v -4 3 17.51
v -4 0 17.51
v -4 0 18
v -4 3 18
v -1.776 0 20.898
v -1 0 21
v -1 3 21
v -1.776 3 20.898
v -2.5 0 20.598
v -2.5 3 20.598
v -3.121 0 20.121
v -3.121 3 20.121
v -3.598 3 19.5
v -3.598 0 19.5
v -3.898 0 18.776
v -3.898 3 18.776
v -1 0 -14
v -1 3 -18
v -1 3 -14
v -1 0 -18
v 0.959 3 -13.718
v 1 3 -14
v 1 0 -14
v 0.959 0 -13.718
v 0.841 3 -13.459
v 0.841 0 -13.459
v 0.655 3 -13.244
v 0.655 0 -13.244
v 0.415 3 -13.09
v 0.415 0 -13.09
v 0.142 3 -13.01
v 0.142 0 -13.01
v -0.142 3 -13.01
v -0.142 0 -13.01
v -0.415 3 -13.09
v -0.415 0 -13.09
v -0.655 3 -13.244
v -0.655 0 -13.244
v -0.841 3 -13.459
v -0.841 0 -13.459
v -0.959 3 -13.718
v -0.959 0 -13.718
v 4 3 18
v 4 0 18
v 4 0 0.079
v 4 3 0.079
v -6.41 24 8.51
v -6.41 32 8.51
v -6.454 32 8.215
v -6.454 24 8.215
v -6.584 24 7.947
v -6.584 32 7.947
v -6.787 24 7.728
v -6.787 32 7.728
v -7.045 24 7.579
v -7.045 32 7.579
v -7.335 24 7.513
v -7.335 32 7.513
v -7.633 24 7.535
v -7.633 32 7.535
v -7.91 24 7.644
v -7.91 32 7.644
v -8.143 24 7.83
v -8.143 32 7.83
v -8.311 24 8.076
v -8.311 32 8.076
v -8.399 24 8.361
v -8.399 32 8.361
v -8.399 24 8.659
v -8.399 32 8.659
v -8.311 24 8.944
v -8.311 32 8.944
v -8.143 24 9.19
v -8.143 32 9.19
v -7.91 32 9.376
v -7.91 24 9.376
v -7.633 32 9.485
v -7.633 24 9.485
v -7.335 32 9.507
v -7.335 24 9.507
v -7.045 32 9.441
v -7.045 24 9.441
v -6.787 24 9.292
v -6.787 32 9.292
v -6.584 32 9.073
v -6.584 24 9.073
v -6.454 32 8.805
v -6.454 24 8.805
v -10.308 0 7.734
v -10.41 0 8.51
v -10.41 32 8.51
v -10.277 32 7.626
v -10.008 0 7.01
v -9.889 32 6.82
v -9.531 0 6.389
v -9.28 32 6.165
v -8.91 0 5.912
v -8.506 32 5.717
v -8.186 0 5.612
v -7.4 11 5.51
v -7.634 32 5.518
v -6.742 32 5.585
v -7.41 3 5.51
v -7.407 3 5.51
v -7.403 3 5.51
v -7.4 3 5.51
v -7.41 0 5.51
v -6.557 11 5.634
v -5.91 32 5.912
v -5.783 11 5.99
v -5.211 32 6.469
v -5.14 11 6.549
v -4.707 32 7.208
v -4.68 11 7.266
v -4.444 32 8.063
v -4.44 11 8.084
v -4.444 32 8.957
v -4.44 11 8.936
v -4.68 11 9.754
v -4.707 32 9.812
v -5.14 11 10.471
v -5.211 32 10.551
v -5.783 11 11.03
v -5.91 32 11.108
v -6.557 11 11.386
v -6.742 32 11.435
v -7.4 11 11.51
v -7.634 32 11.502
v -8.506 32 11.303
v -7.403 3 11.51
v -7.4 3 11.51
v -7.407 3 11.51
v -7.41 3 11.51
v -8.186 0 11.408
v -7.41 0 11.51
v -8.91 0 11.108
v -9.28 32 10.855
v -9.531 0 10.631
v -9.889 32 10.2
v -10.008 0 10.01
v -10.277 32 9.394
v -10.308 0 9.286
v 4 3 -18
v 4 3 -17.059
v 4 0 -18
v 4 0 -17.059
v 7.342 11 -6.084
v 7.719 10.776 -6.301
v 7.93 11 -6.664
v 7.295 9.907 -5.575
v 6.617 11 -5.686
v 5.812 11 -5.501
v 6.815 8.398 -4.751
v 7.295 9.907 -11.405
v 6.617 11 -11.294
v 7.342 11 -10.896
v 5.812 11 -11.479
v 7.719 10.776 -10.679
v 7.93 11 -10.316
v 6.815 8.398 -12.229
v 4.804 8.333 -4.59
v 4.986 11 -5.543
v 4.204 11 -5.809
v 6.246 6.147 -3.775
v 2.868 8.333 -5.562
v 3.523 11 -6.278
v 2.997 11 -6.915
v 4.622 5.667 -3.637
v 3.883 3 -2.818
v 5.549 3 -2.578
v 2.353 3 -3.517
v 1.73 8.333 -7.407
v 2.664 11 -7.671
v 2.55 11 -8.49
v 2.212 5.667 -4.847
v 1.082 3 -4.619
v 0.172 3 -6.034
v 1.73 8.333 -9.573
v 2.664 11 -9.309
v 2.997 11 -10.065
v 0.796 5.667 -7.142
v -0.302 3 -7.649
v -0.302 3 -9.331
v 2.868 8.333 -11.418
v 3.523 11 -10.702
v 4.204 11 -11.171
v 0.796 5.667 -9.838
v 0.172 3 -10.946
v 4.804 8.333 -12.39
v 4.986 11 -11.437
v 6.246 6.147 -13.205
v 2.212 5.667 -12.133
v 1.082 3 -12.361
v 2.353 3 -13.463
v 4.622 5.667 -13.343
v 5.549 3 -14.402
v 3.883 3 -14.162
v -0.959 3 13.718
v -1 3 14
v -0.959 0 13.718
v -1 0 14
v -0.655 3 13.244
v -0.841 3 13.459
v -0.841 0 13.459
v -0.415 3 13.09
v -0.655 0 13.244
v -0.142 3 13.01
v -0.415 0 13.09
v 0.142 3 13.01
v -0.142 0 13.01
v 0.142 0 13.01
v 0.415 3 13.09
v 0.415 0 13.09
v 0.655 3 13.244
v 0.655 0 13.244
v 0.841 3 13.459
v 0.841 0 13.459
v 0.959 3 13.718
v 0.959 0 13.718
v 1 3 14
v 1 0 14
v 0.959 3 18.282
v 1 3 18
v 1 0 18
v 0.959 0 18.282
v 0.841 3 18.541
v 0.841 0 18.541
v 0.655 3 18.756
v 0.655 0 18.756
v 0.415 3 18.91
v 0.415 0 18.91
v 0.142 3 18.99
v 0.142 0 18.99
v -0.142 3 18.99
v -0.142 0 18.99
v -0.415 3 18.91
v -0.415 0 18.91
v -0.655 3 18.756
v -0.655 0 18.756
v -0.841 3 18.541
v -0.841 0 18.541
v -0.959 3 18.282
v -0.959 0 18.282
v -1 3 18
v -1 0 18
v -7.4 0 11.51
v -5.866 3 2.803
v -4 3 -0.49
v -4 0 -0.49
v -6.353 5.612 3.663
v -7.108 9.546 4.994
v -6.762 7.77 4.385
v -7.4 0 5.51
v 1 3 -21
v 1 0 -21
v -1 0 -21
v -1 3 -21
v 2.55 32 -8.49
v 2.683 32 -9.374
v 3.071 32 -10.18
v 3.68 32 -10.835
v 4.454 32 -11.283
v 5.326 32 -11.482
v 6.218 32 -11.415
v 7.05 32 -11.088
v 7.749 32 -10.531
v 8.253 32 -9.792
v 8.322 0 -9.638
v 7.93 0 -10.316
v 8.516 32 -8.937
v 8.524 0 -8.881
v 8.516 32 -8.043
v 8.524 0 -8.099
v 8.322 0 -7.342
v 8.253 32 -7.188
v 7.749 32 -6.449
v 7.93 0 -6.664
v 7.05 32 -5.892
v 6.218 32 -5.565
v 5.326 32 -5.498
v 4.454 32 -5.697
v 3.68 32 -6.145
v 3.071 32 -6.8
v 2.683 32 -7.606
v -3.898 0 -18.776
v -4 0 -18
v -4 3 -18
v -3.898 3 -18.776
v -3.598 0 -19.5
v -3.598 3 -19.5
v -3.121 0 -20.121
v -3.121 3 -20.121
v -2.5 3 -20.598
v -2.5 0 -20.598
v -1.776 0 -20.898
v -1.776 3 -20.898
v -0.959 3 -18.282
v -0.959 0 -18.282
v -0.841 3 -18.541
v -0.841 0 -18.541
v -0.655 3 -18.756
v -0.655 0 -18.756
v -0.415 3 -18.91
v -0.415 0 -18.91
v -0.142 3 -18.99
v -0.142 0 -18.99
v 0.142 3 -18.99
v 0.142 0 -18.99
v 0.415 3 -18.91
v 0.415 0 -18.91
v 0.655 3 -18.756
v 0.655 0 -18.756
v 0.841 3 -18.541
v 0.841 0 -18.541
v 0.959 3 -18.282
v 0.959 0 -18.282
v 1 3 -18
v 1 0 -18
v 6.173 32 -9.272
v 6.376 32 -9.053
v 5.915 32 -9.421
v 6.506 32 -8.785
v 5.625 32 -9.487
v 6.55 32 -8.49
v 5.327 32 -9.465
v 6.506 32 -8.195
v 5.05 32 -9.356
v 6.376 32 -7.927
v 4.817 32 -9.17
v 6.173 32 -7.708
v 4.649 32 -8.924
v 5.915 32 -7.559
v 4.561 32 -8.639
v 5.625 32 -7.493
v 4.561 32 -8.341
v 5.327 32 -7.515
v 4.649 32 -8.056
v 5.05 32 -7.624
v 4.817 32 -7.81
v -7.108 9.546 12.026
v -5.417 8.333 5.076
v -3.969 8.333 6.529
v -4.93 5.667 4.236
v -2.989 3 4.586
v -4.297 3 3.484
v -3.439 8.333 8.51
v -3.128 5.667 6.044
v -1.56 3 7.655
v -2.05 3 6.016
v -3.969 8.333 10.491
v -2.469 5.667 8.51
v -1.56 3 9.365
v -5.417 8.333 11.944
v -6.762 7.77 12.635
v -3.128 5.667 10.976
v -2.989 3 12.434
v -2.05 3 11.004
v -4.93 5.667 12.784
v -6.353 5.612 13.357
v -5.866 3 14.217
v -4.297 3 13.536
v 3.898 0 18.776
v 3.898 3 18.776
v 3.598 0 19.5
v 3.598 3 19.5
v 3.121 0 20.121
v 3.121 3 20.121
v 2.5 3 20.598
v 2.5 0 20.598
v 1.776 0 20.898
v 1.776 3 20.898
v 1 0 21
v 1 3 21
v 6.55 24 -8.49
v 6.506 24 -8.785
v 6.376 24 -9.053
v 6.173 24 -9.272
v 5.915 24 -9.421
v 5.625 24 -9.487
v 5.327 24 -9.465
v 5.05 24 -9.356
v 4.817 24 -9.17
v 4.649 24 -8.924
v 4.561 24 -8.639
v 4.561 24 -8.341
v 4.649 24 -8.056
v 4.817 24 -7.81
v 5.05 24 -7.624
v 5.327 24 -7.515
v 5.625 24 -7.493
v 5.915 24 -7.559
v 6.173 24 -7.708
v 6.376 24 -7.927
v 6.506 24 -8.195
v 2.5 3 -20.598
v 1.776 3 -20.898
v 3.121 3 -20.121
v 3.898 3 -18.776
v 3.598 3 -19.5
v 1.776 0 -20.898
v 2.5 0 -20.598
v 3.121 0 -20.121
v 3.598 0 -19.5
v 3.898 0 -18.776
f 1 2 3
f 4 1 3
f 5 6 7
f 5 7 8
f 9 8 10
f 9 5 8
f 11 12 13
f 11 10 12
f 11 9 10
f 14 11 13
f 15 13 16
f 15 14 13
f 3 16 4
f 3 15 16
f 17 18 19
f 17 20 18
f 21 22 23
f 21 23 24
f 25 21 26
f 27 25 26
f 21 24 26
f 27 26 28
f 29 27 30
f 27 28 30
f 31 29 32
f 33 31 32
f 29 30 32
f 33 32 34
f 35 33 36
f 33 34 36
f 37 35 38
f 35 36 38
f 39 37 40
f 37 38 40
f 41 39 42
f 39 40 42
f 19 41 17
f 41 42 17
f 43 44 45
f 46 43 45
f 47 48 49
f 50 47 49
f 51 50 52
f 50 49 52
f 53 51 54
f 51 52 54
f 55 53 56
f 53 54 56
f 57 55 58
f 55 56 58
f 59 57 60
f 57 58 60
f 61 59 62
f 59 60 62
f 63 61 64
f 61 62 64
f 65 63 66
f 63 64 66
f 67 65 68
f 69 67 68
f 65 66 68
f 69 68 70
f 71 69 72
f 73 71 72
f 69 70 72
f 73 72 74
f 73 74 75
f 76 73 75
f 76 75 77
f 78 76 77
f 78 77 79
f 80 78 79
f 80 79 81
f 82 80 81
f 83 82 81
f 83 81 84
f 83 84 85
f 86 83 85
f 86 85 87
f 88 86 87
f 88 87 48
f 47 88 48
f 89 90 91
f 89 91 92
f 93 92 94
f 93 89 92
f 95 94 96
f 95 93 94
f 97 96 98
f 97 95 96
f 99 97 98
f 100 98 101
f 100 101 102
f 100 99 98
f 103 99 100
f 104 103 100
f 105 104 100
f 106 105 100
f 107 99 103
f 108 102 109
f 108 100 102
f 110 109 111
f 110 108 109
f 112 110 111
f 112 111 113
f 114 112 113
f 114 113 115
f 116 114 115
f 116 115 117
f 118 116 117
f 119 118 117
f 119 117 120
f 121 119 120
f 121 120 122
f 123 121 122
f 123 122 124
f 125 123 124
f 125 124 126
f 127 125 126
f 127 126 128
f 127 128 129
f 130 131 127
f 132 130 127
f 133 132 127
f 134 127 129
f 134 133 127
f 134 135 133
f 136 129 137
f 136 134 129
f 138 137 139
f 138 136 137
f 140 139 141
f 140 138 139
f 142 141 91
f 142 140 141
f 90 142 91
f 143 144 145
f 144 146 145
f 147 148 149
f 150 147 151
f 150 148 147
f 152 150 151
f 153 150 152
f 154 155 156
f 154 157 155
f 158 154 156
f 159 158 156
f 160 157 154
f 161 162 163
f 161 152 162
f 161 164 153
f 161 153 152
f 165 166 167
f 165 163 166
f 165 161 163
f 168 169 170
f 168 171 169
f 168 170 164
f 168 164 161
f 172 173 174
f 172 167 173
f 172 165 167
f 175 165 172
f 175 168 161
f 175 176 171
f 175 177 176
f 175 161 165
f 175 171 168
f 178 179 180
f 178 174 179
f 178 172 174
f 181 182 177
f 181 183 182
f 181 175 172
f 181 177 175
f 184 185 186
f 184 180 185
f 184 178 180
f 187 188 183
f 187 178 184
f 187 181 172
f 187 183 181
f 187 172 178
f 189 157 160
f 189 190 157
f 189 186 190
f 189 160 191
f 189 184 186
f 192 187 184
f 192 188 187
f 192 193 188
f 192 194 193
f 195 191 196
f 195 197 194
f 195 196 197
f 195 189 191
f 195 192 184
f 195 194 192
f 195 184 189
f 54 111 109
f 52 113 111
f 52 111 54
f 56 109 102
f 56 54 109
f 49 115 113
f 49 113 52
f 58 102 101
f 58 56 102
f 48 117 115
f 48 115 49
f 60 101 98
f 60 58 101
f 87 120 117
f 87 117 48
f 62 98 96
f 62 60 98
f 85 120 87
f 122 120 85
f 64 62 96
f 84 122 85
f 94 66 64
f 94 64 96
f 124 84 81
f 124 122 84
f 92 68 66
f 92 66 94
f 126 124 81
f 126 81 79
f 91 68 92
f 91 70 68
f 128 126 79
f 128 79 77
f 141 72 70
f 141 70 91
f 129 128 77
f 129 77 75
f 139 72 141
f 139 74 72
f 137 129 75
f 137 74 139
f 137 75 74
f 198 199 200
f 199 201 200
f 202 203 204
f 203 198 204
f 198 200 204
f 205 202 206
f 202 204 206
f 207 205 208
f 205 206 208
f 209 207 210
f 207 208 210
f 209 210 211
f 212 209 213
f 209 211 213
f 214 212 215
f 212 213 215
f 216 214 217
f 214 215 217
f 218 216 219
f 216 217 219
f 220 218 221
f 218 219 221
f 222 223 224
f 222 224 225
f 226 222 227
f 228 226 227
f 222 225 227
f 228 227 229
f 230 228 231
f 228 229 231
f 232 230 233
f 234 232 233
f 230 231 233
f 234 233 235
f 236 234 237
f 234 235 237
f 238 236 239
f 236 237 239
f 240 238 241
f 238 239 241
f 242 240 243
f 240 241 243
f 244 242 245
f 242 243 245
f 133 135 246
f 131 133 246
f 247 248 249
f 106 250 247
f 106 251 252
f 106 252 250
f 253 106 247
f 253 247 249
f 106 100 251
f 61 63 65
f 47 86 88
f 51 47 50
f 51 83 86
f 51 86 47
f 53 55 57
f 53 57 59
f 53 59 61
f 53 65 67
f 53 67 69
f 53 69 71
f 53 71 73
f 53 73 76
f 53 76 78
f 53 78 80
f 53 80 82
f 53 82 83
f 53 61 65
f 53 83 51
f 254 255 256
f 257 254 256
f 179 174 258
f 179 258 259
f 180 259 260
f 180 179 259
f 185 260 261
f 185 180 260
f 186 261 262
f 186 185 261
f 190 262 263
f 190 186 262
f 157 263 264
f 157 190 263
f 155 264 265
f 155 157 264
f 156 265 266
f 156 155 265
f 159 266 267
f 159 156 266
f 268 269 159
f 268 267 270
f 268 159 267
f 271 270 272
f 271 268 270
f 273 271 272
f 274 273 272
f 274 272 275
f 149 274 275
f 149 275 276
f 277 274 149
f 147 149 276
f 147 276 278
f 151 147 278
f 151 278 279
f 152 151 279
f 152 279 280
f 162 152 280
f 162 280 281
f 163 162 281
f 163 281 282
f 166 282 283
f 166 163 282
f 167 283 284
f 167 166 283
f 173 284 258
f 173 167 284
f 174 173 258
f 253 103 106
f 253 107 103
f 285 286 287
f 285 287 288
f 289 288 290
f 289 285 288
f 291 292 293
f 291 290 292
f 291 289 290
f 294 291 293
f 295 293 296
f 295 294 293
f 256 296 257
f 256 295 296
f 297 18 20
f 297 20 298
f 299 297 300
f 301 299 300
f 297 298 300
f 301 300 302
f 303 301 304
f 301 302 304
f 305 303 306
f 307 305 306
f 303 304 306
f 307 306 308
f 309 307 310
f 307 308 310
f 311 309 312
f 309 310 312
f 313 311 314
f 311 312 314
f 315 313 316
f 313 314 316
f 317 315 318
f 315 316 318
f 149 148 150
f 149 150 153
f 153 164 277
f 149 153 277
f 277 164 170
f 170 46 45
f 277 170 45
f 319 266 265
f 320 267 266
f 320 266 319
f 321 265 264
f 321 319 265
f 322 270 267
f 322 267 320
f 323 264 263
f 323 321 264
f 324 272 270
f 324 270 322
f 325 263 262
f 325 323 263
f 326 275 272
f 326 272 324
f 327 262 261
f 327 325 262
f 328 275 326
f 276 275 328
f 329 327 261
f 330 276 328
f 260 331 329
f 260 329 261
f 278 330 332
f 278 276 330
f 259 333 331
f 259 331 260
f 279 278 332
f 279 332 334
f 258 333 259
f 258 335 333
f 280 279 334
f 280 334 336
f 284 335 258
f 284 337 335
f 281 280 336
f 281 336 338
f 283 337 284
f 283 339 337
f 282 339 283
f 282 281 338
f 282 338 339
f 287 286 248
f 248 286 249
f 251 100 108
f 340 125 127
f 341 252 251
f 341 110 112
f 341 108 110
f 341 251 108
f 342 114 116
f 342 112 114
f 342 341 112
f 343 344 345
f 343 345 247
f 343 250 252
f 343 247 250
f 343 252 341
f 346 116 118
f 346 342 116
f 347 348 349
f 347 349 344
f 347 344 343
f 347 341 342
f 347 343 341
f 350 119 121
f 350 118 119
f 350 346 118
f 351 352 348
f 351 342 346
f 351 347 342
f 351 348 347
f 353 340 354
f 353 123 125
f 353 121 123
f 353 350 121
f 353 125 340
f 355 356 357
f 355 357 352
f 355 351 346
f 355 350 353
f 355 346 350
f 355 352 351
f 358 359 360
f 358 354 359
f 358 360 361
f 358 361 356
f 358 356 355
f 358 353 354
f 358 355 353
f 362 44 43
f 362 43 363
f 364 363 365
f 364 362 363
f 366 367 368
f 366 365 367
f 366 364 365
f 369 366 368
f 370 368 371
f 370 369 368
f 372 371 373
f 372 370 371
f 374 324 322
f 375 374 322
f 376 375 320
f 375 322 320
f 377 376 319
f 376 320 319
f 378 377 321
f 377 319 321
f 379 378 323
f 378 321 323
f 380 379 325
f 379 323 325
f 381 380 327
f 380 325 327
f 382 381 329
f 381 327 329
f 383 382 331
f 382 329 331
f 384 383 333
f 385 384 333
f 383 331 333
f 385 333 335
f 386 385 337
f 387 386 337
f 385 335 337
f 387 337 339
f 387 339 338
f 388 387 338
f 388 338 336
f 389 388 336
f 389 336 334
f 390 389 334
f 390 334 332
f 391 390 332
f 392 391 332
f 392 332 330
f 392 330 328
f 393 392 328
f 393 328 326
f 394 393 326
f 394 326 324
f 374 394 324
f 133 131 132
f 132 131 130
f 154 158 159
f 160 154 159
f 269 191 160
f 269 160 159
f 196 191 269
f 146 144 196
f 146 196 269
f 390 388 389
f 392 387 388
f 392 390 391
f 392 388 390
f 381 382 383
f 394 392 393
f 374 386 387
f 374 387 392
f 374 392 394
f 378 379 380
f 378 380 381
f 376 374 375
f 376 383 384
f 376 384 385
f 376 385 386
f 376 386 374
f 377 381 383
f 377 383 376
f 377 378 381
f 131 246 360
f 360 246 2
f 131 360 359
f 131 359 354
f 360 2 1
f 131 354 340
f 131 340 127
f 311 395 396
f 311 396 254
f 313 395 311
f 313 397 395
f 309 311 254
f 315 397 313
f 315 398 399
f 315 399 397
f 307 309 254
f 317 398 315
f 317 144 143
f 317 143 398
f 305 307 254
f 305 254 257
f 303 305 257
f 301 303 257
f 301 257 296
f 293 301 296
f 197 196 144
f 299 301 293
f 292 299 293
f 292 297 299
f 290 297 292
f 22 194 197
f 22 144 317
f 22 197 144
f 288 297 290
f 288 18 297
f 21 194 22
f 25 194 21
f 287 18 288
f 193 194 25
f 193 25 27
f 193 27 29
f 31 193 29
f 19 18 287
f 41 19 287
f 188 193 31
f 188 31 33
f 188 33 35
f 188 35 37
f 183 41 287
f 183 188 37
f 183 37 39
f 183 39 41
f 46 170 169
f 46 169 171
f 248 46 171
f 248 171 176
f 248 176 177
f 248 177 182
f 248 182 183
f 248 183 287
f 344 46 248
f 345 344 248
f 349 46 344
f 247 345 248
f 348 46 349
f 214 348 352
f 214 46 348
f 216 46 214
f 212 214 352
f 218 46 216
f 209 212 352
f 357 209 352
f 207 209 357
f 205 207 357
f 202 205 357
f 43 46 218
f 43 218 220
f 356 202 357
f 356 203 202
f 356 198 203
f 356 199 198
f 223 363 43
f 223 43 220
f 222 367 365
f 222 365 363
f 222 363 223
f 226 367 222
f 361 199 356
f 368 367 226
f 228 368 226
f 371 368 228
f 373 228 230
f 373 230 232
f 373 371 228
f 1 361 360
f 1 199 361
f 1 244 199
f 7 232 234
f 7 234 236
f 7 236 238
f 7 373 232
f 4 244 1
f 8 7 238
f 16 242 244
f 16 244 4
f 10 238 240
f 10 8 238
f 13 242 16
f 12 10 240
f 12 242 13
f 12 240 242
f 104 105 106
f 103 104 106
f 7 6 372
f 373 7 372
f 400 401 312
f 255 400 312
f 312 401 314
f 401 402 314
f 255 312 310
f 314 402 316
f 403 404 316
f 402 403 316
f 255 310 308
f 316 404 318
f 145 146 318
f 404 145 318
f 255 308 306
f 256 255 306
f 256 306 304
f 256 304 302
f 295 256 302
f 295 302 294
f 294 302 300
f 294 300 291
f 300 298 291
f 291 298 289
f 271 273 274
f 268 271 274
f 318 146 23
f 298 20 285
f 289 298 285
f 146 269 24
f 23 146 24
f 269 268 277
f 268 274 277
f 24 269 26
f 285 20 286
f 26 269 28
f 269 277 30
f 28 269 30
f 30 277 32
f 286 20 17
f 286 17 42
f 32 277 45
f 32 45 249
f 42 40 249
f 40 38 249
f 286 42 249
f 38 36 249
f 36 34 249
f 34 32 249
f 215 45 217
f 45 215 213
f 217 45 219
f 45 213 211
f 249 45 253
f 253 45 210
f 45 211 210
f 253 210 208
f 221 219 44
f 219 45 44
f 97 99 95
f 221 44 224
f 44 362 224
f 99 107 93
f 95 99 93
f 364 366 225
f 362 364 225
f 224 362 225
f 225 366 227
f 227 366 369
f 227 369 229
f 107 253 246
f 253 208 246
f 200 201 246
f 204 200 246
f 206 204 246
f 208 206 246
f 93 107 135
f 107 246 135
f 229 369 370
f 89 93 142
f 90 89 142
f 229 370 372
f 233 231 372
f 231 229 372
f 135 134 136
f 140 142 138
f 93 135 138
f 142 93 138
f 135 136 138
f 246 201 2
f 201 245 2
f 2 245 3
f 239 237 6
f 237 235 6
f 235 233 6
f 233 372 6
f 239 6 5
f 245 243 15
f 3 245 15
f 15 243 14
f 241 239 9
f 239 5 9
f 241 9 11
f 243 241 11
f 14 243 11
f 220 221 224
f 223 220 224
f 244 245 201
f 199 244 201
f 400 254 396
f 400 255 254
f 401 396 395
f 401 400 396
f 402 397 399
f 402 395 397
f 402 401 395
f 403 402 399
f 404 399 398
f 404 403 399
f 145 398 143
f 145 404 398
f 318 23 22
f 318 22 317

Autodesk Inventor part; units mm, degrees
ref_plane "YZ Plane" through (0, 0, 0) normal (1, 0, 0) x (0, 1, 0)
ref_plane "XZ Plane" through (0, 0, 0) normal (0, 1, 0) x (-1, 0, 0)
ref_plane "XY Plane" through (0, 0, 0) normal (0, 0, 1) x (1, 0, 0)
sketch "Sketch1" plane through (0, 0, 0) normal (0, 1, 0) x (-1, 0, 0)
  arc A0 (-1, 14) -> (1, 14) centre (0, 14) ccw
  line L0 (0, -43.0187) -> (0, 32.3947) projected
  arc A1 (1, 18) -> (-1, 18) centre (0, 18) ccw
  line L1 (1, 18) -> (1, 14)
  line L2 (-1, 14) -> (-1, 18)
  line L3 (0, 18) -> (0, 16)
  line L4 (3.8037, 16) -> (0, 16) construction
  line L5 (14.482, 0) -> (-14.022, 0) construction
  arc A2 (1, -14) -> (-1, -14) centre (0, -14) ccw
  arc A3 (-1, -18) -> (1, -18) centre (0, -18) ccw
  line L6 (1, -18) -> (1, -14)
  line L7 (-1, -14) -> (-1, -18)
  line L8 (3.8037, -16) -> (0, -16) construction
  line L9 (1, 21) -> (-1, 21)
  line L10 (-4, 18) -> (-4, -18)
  line L11 (-1, -21) -> (1, -21)
  line L12 (4, -18) -> (4, 18)
  arc A4 (4, 18) -> (1, 21) centre (1, 18) ccw
  arc A5 (-1, 21) -> (-4, 18) centre (-1, 18) ccw
  arc A6 (-4, -18) -> (-1, -21) centre (-1, -18) ccw
  arc A7 (1, -21) -> (4, -18) centre (1, -18) ccw
  line L13 (9.95, -10.51) -> (-9.95, -10.51) construction
  line L14 (-9.95, -10.51) -> (-9.95, 10.51) construction
  line L15 (9.95, 10.51) -> (9.95, -10.51) construction
  circle A8 centre (7.41, 8.51) radius 1
  circle A9 centre (-5.55, -8.49) radius 0.75 construction
  line L16 (0, -32.2454) -> (0, -10.51) construction
  line L17 (9.95, 0) -> (-9.95, 0) construction
  line L18 (9.95, 10.51) -> (-9.95, 10.51) construction
  line L19 (4, 10.51) -> (9, 10.51) construction
  line L20 (9, 10.51) -> (9, 6.51) construction
  line L21 (9, 6.51) -> (4, 6.51) construction
  line L22 (4, 6.51) -> (4, 10.51)
  line L23 (7.41, 8.51) -> (9.1387, 8.51) construction
  circle A10 centre (7.41, 8.51) radius 3
  line L24 (7.41, 11.51) -> (4, 11.51)
  line L25 (7.41, 5.51) -> (4, 5.51)
  arc A11 (-4, -7.2261) -> (-4, -9.7539) centre (-5.55, -8.49) ccw construction
  line L26 (-5.55, -6.49) -> (-4, -6.49) construction
  line L27 (-5.55, -10.49) -> (-4, -10.49) construction
  circle A12 centre (-5.55, -8.49) radius 2 construction
  line L28 (-7.55, -8.49) -> (-7.55, -26.4012) construction
  circle A13 centre (-5.55, -8.49) radius 3
  circle A14 centre (-5.55, -8.49) radius 1
  point P0 (0, 0)
  point P1 (0, 21)
  point P2 (0, 19)
  point P3 (-5.55, -6.94)
  point P4 (-4, -6.94)
  point P5 (-5.55, -10.04)
  point P6 (-4, -10.04)
  point P7 (4, 5.51)
  point P8 (4, 11.51)
  point P9 (-4, -9.7539)
  point P10 (-4, -9.7539)
  dimension "d4" = 2
  dimension "d7" = 2
  dimension "d14" = 2
  dimension "d15" = 16
  dimension "d16" = 2
  dimension "d17" = 2
  dimension "d18" = 16
  dimension "d19" = 42
  dimension "d21" = 8
  dimension "d22" = 3
  dimension "d24" = 19.9
  dimension "d31" = 2.54
  dimension "d33" = 17
  dimension "d34" = 19.9
  dimension "d36" = 15.5
  dimension "d37" = 5
  dimension "d38" = 4
  dimension "d39" = 2
  dimension "d40" = 1.5
  dimension "d45" = 4
  dimension "d46" = 6
  dimension "d51" = 7.55
  dimension "d64" = 6
  dimension "d65" = 2
extrude "Extrusion2" add sketch "Sketch1" along normal blind 32 contours A10 | A8
extrude "Extrusion3" add sketch "Sketch1" along normal blind 32 contours A13 L10 | L10 A13 | A14
extrude "Extrusion4" add sketch "Sketch1" along normal blind 3 contours A0 L0 A2 L7 A3 L11 A6 L10 A13 A5 L9 A1 L2 | A0 L1 A1 L0 L9 A4 L12 A7 L11 A3 L6 A2 | L24 A10 L25 L12 | A13 L10 picked at (-3.0537, -8.3357)
chamfer "Chamfer1" distance 4 distance2 6 2 edges at (4, 1.5, -11.0586) (4, 1.5, -5.9214) measured on face at (8.55, 10.6667, -8.49)
chamfer_without_effect "Chamfer2"
chamfer "Chamfer3" distance 6 distance2 3.4 1 edges at (-4, 1.5, 5.51) measured on face at (-4, 1, -10.1633)
chamfer "Chamfer4" distance 3.4 distance2 6 1 edges at (-4, 1.5, 11.51) measured on face at (-6.2733, 1, 11.51)
chamfer "Chamfer5" distance 8 angle 20 1 edges at (-4.41, 3, 8.51)
chamfer "Chamfer6" distance 8 angle 20 2 edges at (4.586, 3, -5.6491) (4.586, 3, -11.3309) measured on face at (8.3281, 21.3333, -9.6224)
sketch "Sketch2" plane through (-7.41, 32, 8.51) normal (0, 1, 0) x (1, 0, 0)
  circle A0 centre (0, 0) radius 3 projected
  circle A1 centre (0, 0) radius 1
  circle A2 centre (12.96, 17) radius 3 projected
  circle A3 centre (12.96, 17) radius 1
  point P0 (7.41, 8.51)
  dimension "d72" = 2
  dimension "d73" = 2
extrude "Extrusion5" cut sketch "Sketch2" against normal blind 8 contours A1 | A3
properties part number "supporto_mb1202"
